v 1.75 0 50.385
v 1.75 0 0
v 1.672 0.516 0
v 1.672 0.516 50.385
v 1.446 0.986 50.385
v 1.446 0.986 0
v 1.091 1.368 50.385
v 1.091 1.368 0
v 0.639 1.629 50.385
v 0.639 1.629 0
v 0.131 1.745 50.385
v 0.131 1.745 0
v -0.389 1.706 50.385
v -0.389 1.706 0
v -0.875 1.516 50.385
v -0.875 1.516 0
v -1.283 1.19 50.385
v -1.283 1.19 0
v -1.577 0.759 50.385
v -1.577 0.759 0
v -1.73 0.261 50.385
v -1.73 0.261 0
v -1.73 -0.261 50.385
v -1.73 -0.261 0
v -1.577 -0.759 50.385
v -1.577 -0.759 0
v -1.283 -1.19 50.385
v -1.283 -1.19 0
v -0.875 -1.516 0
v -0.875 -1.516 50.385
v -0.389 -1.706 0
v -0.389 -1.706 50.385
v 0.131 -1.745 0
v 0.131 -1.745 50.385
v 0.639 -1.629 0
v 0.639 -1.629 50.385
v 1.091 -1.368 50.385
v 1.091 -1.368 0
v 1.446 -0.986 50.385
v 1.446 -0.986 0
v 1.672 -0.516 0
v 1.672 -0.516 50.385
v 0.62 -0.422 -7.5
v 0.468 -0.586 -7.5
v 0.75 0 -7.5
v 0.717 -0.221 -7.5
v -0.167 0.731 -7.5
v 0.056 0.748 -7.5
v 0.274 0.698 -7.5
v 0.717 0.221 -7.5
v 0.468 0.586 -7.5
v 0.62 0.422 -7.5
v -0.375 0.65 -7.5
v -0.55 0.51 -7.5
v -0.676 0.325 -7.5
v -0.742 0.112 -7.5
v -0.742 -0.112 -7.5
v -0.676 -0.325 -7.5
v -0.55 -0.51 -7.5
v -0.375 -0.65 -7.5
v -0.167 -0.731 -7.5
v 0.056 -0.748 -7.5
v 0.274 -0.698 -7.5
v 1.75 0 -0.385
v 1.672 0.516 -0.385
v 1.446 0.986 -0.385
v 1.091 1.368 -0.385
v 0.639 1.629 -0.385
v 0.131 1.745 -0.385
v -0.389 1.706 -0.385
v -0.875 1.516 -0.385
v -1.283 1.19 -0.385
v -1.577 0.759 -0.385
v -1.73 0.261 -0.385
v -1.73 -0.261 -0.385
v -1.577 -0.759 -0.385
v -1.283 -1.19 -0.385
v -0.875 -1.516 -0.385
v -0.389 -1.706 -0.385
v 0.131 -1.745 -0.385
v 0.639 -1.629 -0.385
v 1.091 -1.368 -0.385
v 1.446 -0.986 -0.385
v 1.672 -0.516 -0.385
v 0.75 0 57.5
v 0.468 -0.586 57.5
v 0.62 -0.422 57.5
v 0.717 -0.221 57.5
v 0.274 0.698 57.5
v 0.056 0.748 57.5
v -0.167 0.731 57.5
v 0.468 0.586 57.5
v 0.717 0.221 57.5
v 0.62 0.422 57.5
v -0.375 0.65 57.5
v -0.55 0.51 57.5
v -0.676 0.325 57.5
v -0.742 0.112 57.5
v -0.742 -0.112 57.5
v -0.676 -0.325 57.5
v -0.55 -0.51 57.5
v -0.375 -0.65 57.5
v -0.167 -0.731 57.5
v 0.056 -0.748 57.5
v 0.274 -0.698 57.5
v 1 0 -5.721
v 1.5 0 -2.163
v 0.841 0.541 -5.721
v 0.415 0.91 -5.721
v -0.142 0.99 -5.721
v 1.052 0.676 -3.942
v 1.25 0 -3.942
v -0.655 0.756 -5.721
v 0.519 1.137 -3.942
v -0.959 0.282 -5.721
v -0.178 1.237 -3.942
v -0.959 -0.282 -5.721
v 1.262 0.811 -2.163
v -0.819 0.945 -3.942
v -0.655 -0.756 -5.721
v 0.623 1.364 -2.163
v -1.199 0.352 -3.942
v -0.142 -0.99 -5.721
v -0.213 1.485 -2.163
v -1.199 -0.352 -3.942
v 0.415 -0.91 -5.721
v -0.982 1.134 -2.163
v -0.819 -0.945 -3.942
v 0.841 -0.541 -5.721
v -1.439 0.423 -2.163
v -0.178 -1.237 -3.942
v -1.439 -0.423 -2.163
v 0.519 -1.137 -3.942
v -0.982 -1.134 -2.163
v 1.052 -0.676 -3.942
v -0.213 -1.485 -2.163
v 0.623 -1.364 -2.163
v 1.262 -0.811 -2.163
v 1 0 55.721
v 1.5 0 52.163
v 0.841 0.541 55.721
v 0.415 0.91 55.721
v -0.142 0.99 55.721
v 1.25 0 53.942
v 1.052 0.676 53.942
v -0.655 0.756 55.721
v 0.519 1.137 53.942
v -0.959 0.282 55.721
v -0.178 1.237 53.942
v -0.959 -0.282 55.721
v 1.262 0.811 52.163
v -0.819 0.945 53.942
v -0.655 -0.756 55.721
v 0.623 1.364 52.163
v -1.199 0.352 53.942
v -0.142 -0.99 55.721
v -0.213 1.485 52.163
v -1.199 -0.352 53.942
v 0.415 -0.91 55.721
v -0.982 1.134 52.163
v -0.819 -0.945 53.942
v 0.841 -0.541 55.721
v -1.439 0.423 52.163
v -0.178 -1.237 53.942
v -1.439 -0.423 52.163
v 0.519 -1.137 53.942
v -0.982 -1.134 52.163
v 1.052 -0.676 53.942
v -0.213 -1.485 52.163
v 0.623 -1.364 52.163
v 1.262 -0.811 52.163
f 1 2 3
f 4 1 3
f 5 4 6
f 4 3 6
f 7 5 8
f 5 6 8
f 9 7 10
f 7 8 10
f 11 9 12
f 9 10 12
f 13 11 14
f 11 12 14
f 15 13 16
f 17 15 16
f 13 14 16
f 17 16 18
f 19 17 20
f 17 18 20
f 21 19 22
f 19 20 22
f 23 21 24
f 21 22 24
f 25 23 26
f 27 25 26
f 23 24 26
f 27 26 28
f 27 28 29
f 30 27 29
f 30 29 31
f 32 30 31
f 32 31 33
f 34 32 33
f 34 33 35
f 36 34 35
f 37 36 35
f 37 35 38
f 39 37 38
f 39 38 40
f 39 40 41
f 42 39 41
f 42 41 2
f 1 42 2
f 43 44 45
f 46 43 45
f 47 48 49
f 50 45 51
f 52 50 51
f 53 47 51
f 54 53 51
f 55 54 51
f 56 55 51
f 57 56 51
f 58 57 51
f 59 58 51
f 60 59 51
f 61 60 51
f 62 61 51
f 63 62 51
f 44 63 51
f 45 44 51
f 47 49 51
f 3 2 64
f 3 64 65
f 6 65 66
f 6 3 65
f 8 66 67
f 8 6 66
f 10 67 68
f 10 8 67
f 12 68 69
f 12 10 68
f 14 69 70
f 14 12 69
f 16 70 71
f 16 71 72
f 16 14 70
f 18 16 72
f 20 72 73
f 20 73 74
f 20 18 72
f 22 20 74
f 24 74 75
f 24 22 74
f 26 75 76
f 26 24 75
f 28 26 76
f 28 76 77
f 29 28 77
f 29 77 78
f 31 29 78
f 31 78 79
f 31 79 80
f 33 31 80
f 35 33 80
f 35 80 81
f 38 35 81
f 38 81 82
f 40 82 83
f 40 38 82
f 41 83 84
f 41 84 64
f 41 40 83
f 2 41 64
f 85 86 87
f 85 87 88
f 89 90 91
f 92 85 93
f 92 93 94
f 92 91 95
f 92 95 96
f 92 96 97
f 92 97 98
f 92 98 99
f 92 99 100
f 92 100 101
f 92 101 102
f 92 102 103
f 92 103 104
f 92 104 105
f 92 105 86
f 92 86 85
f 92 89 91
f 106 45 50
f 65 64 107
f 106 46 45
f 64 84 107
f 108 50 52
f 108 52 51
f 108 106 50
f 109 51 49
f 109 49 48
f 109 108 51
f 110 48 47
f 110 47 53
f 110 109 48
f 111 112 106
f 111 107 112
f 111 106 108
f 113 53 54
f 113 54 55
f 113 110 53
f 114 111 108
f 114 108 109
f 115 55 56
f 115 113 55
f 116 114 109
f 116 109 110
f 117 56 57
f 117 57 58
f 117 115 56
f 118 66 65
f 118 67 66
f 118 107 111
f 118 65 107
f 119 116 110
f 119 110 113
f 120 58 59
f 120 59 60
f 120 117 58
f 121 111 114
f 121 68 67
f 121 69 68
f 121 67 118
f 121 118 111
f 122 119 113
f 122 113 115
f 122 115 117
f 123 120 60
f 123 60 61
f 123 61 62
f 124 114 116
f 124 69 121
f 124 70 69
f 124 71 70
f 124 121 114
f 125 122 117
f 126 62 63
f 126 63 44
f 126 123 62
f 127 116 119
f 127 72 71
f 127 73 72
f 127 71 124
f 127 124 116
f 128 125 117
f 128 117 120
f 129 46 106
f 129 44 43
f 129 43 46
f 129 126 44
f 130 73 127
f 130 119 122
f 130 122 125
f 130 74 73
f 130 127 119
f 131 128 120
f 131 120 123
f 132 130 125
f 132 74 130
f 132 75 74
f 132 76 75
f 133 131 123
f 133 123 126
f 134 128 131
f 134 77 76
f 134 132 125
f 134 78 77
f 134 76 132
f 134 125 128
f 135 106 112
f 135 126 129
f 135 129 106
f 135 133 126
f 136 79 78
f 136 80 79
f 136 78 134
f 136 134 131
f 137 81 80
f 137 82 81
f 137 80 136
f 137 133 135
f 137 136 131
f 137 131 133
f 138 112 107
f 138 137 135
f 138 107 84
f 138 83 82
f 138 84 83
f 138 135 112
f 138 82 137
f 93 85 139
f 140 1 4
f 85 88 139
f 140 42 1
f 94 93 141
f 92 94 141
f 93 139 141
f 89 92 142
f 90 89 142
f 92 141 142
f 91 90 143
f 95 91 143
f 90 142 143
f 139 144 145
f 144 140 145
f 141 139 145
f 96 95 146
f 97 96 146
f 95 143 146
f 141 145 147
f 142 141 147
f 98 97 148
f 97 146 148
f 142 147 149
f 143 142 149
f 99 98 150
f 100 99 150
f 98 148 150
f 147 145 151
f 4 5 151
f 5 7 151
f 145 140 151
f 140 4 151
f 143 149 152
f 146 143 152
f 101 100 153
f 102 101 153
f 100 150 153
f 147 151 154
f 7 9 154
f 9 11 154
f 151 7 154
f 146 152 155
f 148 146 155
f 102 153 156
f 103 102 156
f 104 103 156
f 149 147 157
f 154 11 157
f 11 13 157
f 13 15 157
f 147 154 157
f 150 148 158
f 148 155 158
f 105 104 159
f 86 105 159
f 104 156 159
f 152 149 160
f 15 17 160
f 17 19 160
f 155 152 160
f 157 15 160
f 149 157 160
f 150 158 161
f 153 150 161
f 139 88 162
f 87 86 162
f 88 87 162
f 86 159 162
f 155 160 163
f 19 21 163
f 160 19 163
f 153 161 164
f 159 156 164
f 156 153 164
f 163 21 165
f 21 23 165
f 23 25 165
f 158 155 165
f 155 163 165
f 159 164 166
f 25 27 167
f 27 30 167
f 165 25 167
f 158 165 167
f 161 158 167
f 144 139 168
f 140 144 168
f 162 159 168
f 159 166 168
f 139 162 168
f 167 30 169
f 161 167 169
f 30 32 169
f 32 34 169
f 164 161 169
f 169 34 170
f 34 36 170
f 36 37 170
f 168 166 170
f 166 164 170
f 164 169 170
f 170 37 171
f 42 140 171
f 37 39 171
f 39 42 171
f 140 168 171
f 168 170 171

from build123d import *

# Parameters (mm, degrees)
F0_R     = 1.75
F1_DEPTH = 50
F2_R     = 1.75
F3_DEPTH = 7.5
F4_SIZE2 = 7.1153697224
F4_SIZE  = 1
F5_DEPTH = 7.5
F6_SIZE2 = 7.1153697224
F6_SIZE  = 1


with BuildPart() as f1:
    # F0 (on Top) → F1 (new body)
    with BuildSketch(Plane.XY):
        Circle(F0_R)
    extrude(amount=F1_DEPTH)

    # F2 (on face) → F3 (join)
    with BuildSketch(Plane.XY.offset(50)):
        Circle(F2_R)
    extrude(amount=F3_DEPTH)

    # F4
    f4_edges = [f1.edges().sort_by_distance(p)[0] for p in [
        (-1.75, 0, 57.5),
    ]]
    f4_side = f1.faces().sort_by_distance((0, 0, 57.5))[0]
    chamfer(f4_edges, length=F4_SIZE, length2=F4_SIZE2, reference=f4_side)

    # F5 (add): a face of the model
    f5_faces = [f1.faces().sort_by_distance(p)[0] for p in [
        (0, 0, 0),
    ]]
    extrude(f5_faces, amount=F5_DEPTH)

    # F6
    f6_edges = [f1.edges().sort_by_distance(p)[0] for p in [
        (-1.75, 0, -7.5),
    ]]
    f6_side = f1.faces().sort_by_distance((0, 0, -7.5))[0]
    chamfer(f6_edges, length=F6_SIZE, length2=F6_SIZE2, reference=f6_side)


solid = f1.part
